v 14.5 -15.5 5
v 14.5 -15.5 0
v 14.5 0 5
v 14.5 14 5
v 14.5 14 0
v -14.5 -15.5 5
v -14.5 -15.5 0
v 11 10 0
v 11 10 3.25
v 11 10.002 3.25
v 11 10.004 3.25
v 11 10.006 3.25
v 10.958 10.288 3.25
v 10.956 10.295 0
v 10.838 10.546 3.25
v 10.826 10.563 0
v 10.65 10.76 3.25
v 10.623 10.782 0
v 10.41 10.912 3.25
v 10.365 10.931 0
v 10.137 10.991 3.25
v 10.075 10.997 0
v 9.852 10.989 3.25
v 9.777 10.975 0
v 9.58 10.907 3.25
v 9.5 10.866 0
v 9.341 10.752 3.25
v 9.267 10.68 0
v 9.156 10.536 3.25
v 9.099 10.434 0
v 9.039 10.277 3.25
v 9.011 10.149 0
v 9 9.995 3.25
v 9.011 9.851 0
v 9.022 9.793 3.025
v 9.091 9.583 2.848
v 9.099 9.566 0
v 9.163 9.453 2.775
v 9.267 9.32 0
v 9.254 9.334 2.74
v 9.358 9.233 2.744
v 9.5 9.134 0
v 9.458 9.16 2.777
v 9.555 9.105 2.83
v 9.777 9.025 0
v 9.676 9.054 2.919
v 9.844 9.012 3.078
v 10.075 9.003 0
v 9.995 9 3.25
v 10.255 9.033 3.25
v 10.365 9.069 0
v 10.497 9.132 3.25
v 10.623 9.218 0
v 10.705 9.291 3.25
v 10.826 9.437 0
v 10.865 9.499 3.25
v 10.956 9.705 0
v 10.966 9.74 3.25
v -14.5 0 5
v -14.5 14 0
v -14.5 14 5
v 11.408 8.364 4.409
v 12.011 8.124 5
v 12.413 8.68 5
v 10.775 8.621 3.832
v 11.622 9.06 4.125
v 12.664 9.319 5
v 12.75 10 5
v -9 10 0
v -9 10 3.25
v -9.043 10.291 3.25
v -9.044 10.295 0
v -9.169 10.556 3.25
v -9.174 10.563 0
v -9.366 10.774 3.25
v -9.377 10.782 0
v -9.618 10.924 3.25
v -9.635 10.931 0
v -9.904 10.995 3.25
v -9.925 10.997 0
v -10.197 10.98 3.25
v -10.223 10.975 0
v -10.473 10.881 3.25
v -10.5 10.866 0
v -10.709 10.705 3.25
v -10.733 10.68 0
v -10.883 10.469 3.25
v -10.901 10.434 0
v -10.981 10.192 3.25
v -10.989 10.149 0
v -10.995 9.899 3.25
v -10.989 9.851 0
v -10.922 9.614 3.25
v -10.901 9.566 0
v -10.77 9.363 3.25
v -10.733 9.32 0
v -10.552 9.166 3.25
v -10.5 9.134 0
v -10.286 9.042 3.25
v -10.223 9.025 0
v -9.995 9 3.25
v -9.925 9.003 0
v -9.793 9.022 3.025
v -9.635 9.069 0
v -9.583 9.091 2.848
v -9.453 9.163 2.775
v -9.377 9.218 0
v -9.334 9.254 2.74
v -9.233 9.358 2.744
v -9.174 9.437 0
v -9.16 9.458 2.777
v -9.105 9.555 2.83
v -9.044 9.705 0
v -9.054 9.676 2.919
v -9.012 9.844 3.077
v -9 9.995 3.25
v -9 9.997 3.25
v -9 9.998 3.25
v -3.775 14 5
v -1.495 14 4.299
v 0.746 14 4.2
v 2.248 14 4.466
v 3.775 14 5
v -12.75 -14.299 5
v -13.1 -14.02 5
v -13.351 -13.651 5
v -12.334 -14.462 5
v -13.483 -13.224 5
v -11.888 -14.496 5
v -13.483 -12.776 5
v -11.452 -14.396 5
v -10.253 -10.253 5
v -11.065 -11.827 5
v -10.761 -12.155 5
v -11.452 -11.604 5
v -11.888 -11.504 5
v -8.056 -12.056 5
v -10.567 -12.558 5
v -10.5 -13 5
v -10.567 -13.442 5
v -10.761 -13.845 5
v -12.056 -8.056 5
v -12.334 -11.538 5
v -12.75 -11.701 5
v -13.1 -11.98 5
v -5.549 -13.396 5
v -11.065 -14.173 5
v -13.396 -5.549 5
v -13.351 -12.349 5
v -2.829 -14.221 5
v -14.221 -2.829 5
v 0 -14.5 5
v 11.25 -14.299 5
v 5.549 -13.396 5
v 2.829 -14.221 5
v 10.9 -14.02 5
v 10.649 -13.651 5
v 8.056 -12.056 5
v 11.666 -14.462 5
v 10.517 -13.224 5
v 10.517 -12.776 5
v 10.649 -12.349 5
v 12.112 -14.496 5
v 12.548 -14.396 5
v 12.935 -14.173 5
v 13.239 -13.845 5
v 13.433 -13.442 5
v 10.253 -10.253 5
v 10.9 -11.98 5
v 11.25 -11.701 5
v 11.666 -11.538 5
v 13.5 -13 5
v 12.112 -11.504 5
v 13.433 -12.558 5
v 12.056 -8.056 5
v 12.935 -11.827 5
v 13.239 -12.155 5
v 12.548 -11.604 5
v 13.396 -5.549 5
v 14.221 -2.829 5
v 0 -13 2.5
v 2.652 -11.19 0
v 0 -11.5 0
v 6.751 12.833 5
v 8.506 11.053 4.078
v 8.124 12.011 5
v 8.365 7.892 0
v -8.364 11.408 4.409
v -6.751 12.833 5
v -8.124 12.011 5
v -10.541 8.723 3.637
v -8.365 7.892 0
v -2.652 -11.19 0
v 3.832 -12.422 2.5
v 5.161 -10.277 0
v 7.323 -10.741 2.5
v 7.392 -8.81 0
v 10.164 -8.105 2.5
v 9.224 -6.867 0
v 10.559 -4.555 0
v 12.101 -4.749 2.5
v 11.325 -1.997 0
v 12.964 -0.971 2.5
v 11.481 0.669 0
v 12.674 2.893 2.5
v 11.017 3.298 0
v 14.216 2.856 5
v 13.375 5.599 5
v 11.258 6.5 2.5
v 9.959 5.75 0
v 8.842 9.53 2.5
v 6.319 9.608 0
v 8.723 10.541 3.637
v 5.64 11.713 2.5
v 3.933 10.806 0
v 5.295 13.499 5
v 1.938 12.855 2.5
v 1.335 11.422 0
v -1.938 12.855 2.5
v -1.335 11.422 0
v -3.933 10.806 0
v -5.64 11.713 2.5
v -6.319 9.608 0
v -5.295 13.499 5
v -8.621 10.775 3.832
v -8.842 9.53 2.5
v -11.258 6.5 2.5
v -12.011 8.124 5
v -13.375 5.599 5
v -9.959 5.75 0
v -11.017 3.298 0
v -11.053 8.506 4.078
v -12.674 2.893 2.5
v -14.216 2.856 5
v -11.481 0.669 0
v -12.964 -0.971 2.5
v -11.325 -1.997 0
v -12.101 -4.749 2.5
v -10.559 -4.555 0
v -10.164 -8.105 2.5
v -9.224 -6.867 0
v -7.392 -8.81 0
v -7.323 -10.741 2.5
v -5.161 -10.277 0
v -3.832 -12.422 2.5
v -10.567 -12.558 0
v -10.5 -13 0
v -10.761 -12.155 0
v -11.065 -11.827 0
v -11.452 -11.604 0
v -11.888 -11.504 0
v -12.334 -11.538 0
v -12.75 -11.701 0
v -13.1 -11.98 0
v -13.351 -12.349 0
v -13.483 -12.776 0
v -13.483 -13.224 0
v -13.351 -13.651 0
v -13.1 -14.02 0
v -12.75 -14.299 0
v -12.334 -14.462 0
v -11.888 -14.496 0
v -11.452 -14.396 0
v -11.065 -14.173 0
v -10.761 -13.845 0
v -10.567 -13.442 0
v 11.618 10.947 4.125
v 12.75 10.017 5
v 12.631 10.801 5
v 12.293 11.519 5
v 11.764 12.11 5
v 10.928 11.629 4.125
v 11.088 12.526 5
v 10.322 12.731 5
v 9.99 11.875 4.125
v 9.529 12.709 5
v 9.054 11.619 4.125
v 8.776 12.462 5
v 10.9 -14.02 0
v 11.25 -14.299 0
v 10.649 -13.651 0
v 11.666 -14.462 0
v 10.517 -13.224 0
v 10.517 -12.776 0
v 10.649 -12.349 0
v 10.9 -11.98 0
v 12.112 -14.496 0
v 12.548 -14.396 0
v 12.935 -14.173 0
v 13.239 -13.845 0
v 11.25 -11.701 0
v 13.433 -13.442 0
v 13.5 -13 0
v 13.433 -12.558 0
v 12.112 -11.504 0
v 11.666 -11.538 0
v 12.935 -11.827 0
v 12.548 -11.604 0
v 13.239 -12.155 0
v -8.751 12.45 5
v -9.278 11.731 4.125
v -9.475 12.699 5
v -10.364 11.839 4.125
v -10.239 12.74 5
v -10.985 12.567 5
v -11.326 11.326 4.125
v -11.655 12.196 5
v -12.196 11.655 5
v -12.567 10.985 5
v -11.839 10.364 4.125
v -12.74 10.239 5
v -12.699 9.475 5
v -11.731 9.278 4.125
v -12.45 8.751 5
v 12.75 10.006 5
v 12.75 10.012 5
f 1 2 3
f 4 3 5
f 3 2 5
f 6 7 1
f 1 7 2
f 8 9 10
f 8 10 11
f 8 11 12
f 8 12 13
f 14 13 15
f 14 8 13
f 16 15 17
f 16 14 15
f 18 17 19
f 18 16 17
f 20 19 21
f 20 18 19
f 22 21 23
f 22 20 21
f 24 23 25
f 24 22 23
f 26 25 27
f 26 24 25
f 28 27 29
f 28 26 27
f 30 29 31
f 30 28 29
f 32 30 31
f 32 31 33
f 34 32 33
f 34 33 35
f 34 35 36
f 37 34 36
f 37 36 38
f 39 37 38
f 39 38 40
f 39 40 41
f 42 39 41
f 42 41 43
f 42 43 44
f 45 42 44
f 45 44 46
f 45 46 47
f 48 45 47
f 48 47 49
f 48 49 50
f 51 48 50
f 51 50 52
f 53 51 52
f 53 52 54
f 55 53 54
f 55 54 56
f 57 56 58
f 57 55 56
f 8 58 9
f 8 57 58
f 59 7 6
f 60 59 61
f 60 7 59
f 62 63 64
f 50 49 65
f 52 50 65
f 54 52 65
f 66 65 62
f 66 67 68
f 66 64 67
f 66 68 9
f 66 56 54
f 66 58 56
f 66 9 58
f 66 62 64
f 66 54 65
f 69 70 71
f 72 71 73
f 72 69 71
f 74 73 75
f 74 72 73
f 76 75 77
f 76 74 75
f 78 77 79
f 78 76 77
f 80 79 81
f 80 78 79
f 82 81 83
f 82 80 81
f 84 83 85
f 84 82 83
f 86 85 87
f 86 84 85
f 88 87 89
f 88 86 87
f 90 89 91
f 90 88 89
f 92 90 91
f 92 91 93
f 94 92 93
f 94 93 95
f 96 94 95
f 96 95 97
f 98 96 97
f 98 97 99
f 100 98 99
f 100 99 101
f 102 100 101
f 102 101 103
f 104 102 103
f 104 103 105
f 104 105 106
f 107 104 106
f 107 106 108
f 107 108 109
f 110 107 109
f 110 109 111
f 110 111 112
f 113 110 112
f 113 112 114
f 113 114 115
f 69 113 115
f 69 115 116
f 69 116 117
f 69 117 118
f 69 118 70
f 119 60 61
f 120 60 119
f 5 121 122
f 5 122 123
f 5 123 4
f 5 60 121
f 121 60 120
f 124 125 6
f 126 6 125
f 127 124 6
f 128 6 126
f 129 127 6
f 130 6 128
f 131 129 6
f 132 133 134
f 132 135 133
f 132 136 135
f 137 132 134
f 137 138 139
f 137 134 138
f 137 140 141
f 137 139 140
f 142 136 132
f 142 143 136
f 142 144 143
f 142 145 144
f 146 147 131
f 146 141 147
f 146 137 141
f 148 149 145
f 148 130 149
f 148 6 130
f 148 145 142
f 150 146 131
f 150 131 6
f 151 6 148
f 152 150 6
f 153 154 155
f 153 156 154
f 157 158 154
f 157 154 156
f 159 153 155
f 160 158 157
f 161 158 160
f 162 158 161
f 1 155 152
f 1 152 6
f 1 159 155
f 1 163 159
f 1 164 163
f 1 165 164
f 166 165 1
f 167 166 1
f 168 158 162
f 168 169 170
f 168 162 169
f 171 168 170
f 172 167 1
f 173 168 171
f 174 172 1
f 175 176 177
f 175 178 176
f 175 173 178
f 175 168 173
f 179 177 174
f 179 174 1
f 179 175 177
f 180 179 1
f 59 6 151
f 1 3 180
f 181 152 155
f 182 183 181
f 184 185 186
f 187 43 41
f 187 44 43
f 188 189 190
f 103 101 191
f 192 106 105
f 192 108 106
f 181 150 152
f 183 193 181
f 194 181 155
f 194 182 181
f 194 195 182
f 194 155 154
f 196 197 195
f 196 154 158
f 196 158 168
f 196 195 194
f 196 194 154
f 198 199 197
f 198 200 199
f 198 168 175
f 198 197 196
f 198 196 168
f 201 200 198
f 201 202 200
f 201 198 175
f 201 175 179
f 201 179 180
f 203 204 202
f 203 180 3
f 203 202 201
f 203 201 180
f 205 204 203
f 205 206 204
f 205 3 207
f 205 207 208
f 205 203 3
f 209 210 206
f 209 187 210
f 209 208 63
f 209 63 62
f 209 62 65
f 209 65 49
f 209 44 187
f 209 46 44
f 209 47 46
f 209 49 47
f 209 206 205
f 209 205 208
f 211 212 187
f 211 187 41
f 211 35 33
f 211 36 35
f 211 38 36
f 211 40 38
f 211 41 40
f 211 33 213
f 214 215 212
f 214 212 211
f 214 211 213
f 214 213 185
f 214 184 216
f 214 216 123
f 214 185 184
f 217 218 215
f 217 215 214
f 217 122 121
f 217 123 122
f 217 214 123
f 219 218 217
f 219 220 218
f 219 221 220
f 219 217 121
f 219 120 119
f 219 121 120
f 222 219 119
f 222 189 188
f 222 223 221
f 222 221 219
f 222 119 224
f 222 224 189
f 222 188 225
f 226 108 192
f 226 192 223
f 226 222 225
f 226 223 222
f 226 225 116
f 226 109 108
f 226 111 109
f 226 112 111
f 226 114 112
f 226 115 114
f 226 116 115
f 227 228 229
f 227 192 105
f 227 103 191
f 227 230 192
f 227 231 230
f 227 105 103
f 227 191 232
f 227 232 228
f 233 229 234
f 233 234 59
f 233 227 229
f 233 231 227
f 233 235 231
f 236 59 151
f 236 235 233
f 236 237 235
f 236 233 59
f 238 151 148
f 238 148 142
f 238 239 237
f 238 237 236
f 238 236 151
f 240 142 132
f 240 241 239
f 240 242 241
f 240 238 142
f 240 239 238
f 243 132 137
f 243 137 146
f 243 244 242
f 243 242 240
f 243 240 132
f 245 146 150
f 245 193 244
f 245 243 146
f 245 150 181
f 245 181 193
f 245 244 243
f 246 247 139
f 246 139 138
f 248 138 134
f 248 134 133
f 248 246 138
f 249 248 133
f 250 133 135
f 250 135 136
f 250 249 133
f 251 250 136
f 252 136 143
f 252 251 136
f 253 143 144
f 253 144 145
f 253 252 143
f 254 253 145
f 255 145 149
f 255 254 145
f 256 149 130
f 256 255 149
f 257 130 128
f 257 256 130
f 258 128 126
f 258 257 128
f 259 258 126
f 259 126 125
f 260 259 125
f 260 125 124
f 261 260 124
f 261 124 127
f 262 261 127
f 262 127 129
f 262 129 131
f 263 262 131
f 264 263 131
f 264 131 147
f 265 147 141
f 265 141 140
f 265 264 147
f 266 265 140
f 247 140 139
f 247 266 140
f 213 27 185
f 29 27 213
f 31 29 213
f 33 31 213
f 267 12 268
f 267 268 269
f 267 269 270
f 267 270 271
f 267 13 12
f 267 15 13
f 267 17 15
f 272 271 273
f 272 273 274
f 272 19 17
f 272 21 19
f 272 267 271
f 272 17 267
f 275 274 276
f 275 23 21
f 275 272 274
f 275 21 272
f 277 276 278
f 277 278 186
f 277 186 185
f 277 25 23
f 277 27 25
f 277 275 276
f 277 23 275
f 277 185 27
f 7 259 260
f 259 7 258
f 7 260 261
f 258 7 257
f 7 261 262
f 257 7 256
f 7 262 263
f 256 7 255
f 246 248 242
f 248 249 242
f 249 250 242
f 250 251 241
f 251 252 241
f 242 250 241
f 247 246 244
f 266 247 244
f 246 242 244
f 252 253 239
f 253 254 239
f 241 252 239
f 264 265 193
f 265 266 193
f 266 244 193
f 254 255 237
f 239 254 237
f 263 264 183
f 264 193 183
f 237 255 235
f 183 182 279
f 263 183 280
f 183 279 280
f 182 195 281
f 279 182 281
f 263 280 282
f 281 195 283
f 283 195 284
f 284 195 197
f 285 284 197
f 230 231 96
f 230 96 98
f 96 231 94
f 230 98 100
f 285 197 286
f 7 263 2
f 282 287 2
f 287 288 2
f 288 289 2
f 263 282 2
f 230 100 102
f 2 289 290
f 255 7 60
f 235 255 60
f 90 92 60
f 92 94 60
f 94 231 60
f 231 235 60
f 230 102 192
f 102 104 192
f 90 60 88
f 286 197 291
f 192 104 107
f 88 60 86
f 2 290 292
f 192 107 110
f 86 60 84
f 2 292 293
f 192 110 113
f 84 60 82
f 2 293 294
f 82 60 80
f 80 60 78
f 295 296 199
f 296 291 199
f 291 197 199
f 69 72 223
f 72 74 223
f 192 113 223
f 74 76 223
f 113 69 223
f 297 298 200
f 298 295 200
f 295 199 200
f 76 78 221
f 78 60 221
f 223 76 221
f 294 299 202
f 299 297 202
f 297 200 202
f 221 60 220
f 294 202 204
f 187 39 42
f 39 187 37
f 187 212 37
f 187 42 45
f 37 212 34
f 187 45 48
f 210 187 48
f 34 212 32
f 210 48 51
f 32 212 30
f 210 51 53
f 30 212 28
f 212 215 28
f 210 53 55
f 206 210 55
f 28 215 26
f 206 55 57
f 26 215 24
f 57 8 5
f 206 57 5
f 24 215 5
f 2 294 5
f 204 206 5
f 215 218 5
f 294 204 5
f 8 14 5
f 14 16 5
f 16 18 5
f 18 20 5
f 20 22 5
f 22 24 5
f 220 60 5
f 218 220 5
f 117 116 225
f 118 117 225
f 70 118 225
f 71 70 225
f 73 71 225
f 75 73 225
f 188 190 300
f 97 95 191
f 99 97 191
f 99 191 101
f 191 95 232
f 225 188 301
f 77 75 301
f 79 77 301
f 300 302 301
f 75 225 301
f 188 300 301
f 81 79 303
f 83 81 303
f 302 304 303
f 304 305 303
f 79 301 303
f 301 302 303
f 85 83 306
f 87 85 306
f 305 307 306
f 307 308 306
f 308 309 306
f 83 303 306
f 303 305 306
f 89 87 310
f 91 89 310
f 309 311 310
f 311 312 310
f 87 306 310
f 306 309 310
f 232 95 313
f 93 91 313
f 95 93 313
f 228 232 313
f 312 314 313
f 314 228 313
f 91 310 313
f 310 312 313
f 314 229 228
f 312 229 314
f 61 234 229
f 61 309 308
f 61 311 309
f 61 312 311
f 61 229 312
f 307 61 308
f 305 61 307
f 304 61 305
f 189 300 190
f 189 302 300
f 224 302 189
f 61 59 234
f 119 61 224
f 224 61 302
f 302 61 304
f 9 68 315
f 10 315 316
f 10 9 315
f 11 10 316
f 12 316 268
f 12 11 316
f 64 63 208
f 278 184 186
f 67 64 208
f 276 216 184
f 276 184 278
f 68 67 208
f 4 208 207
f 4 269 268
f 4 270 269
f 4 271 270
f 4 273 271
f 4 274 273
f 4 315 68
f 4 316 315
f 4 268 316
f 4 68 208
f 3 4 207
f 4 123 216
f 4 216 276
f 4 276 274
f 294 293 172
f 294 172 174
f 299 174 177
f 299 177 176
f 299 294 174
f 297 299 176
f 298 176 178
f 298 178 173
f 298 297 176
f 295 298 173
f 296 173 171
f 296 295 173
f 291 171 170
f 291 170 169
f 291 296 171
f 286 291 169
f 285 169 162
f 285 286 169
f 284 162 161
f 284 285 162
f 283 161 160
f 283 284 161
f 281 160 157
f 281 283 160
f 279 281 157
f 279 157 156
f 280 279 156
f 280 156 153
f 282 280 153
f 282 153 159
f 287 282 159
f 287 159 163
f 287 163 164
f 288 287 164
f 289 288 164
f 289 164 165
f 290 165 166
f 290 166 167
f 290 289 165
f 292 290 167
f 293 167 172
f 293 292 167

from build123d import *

# Parameters (mm, degrees)
F0_W        = 29
F0_H        = 29.5
F0_R        = 1.5
F0_R_2      = 1
F0_R_3      = 11.5
F1_DEPTH    = 5
F4_T2_ANGLE = 359.64
F4_T4_ANGLE = 359.64
F4_T6_ANGLE = 359.64


# Not quite as in the source:
# - a fillet or chamfer that OpenCascade refuses, or shapes differently, is made with other operations: its cross-section is extruded or revolved along the edge and cut away or added


with BuildPart() as f1:
    # F0 (on Top) → F1 (new body)
    with BuildSketch(Plane.XY):
        with Locations((0, -0.75)):
            Rectangle(F0_W, F0_H)
        with Locations((-12, -13)):
            Circle(F0_R, mode=Mode.SUBTRACT)
        with Locations((12, -13)):
            Circle(F0_R, mode=Mode.SUBTRACT)
        with Locations((-10, 10)):
            Circle(F0_R_2, mode=Mode.SUBTRACT)
        Circle(F0_R_3, mode=Mode.SUBTRACT)
        with Locations((10, 10)):
            Circle(F0_R_2, mode=Mode.SUBTRACT)
    extrude(amount=F1_DEPTH)

    # F2 (on Right) → F3 (revolve, cut)
    with BuildSketch(Plane.YZ):
        Polygon((-14.5, 5), (-11.5, 0), (-11.5, 5), align=None)
    revolve(axis=Axis((0, 0, 6.3592060469), (0, 0, 1)), mode=Mode.SUBTRACT)

    # F4: chamfer of 1.75 on 3 edges, made by hand

    # F4_s1 → F4_t2 (revolve, cut)
    with BuildSketch(Plane(origin=(0.0313170241, 0.0315144155, 0), x_dir=(0, 0, 1), z_dir=(-0.7048818539, -0.7093247296, 0))):
        Polygon((3.25, 13.1420658351), (5, 11.3920658351), (5, 13.1420658351), align=None)
    revolve(axis=Axis((-10, 10, 5), (0, 0, 1)), revolution_arc=F4_T2_ANGLE, mode=Mode.SUBTRACT)

    # F4_s3 → F4_t4 (revolve, cut)
    with BuildSketch(Plane(origin=(-0.0624354204, 9.9367750216, 0), x_dir=(0, 0, 1), z_dir=(0.006283144, -0.9999802609, 0))):
        Polygon((5, -12.8126340482), (3.25, -11.0626340482), (5, -11.0626340482), align=None)
    revolve(axis=Axis((10, 10, 5), (0, 0, 1)), revolution_arc=F4_T4_ANGLE, mode=Mode.SUBTRACT)

    # F4_s5 → F4_t6 (revolve, cut)
    with BuildSketch(Plane.XZ.offset(-10)):
        Polygon((12.75, 5), (11, 3.25), (11, 5), align=None)
    revolve(axis=Axis((10, 10, 5), (0, 0, 1)), revolution_arc=F4_T6_ANGLE, mode=Mode.SUBTRACT)


solid = f1.part
